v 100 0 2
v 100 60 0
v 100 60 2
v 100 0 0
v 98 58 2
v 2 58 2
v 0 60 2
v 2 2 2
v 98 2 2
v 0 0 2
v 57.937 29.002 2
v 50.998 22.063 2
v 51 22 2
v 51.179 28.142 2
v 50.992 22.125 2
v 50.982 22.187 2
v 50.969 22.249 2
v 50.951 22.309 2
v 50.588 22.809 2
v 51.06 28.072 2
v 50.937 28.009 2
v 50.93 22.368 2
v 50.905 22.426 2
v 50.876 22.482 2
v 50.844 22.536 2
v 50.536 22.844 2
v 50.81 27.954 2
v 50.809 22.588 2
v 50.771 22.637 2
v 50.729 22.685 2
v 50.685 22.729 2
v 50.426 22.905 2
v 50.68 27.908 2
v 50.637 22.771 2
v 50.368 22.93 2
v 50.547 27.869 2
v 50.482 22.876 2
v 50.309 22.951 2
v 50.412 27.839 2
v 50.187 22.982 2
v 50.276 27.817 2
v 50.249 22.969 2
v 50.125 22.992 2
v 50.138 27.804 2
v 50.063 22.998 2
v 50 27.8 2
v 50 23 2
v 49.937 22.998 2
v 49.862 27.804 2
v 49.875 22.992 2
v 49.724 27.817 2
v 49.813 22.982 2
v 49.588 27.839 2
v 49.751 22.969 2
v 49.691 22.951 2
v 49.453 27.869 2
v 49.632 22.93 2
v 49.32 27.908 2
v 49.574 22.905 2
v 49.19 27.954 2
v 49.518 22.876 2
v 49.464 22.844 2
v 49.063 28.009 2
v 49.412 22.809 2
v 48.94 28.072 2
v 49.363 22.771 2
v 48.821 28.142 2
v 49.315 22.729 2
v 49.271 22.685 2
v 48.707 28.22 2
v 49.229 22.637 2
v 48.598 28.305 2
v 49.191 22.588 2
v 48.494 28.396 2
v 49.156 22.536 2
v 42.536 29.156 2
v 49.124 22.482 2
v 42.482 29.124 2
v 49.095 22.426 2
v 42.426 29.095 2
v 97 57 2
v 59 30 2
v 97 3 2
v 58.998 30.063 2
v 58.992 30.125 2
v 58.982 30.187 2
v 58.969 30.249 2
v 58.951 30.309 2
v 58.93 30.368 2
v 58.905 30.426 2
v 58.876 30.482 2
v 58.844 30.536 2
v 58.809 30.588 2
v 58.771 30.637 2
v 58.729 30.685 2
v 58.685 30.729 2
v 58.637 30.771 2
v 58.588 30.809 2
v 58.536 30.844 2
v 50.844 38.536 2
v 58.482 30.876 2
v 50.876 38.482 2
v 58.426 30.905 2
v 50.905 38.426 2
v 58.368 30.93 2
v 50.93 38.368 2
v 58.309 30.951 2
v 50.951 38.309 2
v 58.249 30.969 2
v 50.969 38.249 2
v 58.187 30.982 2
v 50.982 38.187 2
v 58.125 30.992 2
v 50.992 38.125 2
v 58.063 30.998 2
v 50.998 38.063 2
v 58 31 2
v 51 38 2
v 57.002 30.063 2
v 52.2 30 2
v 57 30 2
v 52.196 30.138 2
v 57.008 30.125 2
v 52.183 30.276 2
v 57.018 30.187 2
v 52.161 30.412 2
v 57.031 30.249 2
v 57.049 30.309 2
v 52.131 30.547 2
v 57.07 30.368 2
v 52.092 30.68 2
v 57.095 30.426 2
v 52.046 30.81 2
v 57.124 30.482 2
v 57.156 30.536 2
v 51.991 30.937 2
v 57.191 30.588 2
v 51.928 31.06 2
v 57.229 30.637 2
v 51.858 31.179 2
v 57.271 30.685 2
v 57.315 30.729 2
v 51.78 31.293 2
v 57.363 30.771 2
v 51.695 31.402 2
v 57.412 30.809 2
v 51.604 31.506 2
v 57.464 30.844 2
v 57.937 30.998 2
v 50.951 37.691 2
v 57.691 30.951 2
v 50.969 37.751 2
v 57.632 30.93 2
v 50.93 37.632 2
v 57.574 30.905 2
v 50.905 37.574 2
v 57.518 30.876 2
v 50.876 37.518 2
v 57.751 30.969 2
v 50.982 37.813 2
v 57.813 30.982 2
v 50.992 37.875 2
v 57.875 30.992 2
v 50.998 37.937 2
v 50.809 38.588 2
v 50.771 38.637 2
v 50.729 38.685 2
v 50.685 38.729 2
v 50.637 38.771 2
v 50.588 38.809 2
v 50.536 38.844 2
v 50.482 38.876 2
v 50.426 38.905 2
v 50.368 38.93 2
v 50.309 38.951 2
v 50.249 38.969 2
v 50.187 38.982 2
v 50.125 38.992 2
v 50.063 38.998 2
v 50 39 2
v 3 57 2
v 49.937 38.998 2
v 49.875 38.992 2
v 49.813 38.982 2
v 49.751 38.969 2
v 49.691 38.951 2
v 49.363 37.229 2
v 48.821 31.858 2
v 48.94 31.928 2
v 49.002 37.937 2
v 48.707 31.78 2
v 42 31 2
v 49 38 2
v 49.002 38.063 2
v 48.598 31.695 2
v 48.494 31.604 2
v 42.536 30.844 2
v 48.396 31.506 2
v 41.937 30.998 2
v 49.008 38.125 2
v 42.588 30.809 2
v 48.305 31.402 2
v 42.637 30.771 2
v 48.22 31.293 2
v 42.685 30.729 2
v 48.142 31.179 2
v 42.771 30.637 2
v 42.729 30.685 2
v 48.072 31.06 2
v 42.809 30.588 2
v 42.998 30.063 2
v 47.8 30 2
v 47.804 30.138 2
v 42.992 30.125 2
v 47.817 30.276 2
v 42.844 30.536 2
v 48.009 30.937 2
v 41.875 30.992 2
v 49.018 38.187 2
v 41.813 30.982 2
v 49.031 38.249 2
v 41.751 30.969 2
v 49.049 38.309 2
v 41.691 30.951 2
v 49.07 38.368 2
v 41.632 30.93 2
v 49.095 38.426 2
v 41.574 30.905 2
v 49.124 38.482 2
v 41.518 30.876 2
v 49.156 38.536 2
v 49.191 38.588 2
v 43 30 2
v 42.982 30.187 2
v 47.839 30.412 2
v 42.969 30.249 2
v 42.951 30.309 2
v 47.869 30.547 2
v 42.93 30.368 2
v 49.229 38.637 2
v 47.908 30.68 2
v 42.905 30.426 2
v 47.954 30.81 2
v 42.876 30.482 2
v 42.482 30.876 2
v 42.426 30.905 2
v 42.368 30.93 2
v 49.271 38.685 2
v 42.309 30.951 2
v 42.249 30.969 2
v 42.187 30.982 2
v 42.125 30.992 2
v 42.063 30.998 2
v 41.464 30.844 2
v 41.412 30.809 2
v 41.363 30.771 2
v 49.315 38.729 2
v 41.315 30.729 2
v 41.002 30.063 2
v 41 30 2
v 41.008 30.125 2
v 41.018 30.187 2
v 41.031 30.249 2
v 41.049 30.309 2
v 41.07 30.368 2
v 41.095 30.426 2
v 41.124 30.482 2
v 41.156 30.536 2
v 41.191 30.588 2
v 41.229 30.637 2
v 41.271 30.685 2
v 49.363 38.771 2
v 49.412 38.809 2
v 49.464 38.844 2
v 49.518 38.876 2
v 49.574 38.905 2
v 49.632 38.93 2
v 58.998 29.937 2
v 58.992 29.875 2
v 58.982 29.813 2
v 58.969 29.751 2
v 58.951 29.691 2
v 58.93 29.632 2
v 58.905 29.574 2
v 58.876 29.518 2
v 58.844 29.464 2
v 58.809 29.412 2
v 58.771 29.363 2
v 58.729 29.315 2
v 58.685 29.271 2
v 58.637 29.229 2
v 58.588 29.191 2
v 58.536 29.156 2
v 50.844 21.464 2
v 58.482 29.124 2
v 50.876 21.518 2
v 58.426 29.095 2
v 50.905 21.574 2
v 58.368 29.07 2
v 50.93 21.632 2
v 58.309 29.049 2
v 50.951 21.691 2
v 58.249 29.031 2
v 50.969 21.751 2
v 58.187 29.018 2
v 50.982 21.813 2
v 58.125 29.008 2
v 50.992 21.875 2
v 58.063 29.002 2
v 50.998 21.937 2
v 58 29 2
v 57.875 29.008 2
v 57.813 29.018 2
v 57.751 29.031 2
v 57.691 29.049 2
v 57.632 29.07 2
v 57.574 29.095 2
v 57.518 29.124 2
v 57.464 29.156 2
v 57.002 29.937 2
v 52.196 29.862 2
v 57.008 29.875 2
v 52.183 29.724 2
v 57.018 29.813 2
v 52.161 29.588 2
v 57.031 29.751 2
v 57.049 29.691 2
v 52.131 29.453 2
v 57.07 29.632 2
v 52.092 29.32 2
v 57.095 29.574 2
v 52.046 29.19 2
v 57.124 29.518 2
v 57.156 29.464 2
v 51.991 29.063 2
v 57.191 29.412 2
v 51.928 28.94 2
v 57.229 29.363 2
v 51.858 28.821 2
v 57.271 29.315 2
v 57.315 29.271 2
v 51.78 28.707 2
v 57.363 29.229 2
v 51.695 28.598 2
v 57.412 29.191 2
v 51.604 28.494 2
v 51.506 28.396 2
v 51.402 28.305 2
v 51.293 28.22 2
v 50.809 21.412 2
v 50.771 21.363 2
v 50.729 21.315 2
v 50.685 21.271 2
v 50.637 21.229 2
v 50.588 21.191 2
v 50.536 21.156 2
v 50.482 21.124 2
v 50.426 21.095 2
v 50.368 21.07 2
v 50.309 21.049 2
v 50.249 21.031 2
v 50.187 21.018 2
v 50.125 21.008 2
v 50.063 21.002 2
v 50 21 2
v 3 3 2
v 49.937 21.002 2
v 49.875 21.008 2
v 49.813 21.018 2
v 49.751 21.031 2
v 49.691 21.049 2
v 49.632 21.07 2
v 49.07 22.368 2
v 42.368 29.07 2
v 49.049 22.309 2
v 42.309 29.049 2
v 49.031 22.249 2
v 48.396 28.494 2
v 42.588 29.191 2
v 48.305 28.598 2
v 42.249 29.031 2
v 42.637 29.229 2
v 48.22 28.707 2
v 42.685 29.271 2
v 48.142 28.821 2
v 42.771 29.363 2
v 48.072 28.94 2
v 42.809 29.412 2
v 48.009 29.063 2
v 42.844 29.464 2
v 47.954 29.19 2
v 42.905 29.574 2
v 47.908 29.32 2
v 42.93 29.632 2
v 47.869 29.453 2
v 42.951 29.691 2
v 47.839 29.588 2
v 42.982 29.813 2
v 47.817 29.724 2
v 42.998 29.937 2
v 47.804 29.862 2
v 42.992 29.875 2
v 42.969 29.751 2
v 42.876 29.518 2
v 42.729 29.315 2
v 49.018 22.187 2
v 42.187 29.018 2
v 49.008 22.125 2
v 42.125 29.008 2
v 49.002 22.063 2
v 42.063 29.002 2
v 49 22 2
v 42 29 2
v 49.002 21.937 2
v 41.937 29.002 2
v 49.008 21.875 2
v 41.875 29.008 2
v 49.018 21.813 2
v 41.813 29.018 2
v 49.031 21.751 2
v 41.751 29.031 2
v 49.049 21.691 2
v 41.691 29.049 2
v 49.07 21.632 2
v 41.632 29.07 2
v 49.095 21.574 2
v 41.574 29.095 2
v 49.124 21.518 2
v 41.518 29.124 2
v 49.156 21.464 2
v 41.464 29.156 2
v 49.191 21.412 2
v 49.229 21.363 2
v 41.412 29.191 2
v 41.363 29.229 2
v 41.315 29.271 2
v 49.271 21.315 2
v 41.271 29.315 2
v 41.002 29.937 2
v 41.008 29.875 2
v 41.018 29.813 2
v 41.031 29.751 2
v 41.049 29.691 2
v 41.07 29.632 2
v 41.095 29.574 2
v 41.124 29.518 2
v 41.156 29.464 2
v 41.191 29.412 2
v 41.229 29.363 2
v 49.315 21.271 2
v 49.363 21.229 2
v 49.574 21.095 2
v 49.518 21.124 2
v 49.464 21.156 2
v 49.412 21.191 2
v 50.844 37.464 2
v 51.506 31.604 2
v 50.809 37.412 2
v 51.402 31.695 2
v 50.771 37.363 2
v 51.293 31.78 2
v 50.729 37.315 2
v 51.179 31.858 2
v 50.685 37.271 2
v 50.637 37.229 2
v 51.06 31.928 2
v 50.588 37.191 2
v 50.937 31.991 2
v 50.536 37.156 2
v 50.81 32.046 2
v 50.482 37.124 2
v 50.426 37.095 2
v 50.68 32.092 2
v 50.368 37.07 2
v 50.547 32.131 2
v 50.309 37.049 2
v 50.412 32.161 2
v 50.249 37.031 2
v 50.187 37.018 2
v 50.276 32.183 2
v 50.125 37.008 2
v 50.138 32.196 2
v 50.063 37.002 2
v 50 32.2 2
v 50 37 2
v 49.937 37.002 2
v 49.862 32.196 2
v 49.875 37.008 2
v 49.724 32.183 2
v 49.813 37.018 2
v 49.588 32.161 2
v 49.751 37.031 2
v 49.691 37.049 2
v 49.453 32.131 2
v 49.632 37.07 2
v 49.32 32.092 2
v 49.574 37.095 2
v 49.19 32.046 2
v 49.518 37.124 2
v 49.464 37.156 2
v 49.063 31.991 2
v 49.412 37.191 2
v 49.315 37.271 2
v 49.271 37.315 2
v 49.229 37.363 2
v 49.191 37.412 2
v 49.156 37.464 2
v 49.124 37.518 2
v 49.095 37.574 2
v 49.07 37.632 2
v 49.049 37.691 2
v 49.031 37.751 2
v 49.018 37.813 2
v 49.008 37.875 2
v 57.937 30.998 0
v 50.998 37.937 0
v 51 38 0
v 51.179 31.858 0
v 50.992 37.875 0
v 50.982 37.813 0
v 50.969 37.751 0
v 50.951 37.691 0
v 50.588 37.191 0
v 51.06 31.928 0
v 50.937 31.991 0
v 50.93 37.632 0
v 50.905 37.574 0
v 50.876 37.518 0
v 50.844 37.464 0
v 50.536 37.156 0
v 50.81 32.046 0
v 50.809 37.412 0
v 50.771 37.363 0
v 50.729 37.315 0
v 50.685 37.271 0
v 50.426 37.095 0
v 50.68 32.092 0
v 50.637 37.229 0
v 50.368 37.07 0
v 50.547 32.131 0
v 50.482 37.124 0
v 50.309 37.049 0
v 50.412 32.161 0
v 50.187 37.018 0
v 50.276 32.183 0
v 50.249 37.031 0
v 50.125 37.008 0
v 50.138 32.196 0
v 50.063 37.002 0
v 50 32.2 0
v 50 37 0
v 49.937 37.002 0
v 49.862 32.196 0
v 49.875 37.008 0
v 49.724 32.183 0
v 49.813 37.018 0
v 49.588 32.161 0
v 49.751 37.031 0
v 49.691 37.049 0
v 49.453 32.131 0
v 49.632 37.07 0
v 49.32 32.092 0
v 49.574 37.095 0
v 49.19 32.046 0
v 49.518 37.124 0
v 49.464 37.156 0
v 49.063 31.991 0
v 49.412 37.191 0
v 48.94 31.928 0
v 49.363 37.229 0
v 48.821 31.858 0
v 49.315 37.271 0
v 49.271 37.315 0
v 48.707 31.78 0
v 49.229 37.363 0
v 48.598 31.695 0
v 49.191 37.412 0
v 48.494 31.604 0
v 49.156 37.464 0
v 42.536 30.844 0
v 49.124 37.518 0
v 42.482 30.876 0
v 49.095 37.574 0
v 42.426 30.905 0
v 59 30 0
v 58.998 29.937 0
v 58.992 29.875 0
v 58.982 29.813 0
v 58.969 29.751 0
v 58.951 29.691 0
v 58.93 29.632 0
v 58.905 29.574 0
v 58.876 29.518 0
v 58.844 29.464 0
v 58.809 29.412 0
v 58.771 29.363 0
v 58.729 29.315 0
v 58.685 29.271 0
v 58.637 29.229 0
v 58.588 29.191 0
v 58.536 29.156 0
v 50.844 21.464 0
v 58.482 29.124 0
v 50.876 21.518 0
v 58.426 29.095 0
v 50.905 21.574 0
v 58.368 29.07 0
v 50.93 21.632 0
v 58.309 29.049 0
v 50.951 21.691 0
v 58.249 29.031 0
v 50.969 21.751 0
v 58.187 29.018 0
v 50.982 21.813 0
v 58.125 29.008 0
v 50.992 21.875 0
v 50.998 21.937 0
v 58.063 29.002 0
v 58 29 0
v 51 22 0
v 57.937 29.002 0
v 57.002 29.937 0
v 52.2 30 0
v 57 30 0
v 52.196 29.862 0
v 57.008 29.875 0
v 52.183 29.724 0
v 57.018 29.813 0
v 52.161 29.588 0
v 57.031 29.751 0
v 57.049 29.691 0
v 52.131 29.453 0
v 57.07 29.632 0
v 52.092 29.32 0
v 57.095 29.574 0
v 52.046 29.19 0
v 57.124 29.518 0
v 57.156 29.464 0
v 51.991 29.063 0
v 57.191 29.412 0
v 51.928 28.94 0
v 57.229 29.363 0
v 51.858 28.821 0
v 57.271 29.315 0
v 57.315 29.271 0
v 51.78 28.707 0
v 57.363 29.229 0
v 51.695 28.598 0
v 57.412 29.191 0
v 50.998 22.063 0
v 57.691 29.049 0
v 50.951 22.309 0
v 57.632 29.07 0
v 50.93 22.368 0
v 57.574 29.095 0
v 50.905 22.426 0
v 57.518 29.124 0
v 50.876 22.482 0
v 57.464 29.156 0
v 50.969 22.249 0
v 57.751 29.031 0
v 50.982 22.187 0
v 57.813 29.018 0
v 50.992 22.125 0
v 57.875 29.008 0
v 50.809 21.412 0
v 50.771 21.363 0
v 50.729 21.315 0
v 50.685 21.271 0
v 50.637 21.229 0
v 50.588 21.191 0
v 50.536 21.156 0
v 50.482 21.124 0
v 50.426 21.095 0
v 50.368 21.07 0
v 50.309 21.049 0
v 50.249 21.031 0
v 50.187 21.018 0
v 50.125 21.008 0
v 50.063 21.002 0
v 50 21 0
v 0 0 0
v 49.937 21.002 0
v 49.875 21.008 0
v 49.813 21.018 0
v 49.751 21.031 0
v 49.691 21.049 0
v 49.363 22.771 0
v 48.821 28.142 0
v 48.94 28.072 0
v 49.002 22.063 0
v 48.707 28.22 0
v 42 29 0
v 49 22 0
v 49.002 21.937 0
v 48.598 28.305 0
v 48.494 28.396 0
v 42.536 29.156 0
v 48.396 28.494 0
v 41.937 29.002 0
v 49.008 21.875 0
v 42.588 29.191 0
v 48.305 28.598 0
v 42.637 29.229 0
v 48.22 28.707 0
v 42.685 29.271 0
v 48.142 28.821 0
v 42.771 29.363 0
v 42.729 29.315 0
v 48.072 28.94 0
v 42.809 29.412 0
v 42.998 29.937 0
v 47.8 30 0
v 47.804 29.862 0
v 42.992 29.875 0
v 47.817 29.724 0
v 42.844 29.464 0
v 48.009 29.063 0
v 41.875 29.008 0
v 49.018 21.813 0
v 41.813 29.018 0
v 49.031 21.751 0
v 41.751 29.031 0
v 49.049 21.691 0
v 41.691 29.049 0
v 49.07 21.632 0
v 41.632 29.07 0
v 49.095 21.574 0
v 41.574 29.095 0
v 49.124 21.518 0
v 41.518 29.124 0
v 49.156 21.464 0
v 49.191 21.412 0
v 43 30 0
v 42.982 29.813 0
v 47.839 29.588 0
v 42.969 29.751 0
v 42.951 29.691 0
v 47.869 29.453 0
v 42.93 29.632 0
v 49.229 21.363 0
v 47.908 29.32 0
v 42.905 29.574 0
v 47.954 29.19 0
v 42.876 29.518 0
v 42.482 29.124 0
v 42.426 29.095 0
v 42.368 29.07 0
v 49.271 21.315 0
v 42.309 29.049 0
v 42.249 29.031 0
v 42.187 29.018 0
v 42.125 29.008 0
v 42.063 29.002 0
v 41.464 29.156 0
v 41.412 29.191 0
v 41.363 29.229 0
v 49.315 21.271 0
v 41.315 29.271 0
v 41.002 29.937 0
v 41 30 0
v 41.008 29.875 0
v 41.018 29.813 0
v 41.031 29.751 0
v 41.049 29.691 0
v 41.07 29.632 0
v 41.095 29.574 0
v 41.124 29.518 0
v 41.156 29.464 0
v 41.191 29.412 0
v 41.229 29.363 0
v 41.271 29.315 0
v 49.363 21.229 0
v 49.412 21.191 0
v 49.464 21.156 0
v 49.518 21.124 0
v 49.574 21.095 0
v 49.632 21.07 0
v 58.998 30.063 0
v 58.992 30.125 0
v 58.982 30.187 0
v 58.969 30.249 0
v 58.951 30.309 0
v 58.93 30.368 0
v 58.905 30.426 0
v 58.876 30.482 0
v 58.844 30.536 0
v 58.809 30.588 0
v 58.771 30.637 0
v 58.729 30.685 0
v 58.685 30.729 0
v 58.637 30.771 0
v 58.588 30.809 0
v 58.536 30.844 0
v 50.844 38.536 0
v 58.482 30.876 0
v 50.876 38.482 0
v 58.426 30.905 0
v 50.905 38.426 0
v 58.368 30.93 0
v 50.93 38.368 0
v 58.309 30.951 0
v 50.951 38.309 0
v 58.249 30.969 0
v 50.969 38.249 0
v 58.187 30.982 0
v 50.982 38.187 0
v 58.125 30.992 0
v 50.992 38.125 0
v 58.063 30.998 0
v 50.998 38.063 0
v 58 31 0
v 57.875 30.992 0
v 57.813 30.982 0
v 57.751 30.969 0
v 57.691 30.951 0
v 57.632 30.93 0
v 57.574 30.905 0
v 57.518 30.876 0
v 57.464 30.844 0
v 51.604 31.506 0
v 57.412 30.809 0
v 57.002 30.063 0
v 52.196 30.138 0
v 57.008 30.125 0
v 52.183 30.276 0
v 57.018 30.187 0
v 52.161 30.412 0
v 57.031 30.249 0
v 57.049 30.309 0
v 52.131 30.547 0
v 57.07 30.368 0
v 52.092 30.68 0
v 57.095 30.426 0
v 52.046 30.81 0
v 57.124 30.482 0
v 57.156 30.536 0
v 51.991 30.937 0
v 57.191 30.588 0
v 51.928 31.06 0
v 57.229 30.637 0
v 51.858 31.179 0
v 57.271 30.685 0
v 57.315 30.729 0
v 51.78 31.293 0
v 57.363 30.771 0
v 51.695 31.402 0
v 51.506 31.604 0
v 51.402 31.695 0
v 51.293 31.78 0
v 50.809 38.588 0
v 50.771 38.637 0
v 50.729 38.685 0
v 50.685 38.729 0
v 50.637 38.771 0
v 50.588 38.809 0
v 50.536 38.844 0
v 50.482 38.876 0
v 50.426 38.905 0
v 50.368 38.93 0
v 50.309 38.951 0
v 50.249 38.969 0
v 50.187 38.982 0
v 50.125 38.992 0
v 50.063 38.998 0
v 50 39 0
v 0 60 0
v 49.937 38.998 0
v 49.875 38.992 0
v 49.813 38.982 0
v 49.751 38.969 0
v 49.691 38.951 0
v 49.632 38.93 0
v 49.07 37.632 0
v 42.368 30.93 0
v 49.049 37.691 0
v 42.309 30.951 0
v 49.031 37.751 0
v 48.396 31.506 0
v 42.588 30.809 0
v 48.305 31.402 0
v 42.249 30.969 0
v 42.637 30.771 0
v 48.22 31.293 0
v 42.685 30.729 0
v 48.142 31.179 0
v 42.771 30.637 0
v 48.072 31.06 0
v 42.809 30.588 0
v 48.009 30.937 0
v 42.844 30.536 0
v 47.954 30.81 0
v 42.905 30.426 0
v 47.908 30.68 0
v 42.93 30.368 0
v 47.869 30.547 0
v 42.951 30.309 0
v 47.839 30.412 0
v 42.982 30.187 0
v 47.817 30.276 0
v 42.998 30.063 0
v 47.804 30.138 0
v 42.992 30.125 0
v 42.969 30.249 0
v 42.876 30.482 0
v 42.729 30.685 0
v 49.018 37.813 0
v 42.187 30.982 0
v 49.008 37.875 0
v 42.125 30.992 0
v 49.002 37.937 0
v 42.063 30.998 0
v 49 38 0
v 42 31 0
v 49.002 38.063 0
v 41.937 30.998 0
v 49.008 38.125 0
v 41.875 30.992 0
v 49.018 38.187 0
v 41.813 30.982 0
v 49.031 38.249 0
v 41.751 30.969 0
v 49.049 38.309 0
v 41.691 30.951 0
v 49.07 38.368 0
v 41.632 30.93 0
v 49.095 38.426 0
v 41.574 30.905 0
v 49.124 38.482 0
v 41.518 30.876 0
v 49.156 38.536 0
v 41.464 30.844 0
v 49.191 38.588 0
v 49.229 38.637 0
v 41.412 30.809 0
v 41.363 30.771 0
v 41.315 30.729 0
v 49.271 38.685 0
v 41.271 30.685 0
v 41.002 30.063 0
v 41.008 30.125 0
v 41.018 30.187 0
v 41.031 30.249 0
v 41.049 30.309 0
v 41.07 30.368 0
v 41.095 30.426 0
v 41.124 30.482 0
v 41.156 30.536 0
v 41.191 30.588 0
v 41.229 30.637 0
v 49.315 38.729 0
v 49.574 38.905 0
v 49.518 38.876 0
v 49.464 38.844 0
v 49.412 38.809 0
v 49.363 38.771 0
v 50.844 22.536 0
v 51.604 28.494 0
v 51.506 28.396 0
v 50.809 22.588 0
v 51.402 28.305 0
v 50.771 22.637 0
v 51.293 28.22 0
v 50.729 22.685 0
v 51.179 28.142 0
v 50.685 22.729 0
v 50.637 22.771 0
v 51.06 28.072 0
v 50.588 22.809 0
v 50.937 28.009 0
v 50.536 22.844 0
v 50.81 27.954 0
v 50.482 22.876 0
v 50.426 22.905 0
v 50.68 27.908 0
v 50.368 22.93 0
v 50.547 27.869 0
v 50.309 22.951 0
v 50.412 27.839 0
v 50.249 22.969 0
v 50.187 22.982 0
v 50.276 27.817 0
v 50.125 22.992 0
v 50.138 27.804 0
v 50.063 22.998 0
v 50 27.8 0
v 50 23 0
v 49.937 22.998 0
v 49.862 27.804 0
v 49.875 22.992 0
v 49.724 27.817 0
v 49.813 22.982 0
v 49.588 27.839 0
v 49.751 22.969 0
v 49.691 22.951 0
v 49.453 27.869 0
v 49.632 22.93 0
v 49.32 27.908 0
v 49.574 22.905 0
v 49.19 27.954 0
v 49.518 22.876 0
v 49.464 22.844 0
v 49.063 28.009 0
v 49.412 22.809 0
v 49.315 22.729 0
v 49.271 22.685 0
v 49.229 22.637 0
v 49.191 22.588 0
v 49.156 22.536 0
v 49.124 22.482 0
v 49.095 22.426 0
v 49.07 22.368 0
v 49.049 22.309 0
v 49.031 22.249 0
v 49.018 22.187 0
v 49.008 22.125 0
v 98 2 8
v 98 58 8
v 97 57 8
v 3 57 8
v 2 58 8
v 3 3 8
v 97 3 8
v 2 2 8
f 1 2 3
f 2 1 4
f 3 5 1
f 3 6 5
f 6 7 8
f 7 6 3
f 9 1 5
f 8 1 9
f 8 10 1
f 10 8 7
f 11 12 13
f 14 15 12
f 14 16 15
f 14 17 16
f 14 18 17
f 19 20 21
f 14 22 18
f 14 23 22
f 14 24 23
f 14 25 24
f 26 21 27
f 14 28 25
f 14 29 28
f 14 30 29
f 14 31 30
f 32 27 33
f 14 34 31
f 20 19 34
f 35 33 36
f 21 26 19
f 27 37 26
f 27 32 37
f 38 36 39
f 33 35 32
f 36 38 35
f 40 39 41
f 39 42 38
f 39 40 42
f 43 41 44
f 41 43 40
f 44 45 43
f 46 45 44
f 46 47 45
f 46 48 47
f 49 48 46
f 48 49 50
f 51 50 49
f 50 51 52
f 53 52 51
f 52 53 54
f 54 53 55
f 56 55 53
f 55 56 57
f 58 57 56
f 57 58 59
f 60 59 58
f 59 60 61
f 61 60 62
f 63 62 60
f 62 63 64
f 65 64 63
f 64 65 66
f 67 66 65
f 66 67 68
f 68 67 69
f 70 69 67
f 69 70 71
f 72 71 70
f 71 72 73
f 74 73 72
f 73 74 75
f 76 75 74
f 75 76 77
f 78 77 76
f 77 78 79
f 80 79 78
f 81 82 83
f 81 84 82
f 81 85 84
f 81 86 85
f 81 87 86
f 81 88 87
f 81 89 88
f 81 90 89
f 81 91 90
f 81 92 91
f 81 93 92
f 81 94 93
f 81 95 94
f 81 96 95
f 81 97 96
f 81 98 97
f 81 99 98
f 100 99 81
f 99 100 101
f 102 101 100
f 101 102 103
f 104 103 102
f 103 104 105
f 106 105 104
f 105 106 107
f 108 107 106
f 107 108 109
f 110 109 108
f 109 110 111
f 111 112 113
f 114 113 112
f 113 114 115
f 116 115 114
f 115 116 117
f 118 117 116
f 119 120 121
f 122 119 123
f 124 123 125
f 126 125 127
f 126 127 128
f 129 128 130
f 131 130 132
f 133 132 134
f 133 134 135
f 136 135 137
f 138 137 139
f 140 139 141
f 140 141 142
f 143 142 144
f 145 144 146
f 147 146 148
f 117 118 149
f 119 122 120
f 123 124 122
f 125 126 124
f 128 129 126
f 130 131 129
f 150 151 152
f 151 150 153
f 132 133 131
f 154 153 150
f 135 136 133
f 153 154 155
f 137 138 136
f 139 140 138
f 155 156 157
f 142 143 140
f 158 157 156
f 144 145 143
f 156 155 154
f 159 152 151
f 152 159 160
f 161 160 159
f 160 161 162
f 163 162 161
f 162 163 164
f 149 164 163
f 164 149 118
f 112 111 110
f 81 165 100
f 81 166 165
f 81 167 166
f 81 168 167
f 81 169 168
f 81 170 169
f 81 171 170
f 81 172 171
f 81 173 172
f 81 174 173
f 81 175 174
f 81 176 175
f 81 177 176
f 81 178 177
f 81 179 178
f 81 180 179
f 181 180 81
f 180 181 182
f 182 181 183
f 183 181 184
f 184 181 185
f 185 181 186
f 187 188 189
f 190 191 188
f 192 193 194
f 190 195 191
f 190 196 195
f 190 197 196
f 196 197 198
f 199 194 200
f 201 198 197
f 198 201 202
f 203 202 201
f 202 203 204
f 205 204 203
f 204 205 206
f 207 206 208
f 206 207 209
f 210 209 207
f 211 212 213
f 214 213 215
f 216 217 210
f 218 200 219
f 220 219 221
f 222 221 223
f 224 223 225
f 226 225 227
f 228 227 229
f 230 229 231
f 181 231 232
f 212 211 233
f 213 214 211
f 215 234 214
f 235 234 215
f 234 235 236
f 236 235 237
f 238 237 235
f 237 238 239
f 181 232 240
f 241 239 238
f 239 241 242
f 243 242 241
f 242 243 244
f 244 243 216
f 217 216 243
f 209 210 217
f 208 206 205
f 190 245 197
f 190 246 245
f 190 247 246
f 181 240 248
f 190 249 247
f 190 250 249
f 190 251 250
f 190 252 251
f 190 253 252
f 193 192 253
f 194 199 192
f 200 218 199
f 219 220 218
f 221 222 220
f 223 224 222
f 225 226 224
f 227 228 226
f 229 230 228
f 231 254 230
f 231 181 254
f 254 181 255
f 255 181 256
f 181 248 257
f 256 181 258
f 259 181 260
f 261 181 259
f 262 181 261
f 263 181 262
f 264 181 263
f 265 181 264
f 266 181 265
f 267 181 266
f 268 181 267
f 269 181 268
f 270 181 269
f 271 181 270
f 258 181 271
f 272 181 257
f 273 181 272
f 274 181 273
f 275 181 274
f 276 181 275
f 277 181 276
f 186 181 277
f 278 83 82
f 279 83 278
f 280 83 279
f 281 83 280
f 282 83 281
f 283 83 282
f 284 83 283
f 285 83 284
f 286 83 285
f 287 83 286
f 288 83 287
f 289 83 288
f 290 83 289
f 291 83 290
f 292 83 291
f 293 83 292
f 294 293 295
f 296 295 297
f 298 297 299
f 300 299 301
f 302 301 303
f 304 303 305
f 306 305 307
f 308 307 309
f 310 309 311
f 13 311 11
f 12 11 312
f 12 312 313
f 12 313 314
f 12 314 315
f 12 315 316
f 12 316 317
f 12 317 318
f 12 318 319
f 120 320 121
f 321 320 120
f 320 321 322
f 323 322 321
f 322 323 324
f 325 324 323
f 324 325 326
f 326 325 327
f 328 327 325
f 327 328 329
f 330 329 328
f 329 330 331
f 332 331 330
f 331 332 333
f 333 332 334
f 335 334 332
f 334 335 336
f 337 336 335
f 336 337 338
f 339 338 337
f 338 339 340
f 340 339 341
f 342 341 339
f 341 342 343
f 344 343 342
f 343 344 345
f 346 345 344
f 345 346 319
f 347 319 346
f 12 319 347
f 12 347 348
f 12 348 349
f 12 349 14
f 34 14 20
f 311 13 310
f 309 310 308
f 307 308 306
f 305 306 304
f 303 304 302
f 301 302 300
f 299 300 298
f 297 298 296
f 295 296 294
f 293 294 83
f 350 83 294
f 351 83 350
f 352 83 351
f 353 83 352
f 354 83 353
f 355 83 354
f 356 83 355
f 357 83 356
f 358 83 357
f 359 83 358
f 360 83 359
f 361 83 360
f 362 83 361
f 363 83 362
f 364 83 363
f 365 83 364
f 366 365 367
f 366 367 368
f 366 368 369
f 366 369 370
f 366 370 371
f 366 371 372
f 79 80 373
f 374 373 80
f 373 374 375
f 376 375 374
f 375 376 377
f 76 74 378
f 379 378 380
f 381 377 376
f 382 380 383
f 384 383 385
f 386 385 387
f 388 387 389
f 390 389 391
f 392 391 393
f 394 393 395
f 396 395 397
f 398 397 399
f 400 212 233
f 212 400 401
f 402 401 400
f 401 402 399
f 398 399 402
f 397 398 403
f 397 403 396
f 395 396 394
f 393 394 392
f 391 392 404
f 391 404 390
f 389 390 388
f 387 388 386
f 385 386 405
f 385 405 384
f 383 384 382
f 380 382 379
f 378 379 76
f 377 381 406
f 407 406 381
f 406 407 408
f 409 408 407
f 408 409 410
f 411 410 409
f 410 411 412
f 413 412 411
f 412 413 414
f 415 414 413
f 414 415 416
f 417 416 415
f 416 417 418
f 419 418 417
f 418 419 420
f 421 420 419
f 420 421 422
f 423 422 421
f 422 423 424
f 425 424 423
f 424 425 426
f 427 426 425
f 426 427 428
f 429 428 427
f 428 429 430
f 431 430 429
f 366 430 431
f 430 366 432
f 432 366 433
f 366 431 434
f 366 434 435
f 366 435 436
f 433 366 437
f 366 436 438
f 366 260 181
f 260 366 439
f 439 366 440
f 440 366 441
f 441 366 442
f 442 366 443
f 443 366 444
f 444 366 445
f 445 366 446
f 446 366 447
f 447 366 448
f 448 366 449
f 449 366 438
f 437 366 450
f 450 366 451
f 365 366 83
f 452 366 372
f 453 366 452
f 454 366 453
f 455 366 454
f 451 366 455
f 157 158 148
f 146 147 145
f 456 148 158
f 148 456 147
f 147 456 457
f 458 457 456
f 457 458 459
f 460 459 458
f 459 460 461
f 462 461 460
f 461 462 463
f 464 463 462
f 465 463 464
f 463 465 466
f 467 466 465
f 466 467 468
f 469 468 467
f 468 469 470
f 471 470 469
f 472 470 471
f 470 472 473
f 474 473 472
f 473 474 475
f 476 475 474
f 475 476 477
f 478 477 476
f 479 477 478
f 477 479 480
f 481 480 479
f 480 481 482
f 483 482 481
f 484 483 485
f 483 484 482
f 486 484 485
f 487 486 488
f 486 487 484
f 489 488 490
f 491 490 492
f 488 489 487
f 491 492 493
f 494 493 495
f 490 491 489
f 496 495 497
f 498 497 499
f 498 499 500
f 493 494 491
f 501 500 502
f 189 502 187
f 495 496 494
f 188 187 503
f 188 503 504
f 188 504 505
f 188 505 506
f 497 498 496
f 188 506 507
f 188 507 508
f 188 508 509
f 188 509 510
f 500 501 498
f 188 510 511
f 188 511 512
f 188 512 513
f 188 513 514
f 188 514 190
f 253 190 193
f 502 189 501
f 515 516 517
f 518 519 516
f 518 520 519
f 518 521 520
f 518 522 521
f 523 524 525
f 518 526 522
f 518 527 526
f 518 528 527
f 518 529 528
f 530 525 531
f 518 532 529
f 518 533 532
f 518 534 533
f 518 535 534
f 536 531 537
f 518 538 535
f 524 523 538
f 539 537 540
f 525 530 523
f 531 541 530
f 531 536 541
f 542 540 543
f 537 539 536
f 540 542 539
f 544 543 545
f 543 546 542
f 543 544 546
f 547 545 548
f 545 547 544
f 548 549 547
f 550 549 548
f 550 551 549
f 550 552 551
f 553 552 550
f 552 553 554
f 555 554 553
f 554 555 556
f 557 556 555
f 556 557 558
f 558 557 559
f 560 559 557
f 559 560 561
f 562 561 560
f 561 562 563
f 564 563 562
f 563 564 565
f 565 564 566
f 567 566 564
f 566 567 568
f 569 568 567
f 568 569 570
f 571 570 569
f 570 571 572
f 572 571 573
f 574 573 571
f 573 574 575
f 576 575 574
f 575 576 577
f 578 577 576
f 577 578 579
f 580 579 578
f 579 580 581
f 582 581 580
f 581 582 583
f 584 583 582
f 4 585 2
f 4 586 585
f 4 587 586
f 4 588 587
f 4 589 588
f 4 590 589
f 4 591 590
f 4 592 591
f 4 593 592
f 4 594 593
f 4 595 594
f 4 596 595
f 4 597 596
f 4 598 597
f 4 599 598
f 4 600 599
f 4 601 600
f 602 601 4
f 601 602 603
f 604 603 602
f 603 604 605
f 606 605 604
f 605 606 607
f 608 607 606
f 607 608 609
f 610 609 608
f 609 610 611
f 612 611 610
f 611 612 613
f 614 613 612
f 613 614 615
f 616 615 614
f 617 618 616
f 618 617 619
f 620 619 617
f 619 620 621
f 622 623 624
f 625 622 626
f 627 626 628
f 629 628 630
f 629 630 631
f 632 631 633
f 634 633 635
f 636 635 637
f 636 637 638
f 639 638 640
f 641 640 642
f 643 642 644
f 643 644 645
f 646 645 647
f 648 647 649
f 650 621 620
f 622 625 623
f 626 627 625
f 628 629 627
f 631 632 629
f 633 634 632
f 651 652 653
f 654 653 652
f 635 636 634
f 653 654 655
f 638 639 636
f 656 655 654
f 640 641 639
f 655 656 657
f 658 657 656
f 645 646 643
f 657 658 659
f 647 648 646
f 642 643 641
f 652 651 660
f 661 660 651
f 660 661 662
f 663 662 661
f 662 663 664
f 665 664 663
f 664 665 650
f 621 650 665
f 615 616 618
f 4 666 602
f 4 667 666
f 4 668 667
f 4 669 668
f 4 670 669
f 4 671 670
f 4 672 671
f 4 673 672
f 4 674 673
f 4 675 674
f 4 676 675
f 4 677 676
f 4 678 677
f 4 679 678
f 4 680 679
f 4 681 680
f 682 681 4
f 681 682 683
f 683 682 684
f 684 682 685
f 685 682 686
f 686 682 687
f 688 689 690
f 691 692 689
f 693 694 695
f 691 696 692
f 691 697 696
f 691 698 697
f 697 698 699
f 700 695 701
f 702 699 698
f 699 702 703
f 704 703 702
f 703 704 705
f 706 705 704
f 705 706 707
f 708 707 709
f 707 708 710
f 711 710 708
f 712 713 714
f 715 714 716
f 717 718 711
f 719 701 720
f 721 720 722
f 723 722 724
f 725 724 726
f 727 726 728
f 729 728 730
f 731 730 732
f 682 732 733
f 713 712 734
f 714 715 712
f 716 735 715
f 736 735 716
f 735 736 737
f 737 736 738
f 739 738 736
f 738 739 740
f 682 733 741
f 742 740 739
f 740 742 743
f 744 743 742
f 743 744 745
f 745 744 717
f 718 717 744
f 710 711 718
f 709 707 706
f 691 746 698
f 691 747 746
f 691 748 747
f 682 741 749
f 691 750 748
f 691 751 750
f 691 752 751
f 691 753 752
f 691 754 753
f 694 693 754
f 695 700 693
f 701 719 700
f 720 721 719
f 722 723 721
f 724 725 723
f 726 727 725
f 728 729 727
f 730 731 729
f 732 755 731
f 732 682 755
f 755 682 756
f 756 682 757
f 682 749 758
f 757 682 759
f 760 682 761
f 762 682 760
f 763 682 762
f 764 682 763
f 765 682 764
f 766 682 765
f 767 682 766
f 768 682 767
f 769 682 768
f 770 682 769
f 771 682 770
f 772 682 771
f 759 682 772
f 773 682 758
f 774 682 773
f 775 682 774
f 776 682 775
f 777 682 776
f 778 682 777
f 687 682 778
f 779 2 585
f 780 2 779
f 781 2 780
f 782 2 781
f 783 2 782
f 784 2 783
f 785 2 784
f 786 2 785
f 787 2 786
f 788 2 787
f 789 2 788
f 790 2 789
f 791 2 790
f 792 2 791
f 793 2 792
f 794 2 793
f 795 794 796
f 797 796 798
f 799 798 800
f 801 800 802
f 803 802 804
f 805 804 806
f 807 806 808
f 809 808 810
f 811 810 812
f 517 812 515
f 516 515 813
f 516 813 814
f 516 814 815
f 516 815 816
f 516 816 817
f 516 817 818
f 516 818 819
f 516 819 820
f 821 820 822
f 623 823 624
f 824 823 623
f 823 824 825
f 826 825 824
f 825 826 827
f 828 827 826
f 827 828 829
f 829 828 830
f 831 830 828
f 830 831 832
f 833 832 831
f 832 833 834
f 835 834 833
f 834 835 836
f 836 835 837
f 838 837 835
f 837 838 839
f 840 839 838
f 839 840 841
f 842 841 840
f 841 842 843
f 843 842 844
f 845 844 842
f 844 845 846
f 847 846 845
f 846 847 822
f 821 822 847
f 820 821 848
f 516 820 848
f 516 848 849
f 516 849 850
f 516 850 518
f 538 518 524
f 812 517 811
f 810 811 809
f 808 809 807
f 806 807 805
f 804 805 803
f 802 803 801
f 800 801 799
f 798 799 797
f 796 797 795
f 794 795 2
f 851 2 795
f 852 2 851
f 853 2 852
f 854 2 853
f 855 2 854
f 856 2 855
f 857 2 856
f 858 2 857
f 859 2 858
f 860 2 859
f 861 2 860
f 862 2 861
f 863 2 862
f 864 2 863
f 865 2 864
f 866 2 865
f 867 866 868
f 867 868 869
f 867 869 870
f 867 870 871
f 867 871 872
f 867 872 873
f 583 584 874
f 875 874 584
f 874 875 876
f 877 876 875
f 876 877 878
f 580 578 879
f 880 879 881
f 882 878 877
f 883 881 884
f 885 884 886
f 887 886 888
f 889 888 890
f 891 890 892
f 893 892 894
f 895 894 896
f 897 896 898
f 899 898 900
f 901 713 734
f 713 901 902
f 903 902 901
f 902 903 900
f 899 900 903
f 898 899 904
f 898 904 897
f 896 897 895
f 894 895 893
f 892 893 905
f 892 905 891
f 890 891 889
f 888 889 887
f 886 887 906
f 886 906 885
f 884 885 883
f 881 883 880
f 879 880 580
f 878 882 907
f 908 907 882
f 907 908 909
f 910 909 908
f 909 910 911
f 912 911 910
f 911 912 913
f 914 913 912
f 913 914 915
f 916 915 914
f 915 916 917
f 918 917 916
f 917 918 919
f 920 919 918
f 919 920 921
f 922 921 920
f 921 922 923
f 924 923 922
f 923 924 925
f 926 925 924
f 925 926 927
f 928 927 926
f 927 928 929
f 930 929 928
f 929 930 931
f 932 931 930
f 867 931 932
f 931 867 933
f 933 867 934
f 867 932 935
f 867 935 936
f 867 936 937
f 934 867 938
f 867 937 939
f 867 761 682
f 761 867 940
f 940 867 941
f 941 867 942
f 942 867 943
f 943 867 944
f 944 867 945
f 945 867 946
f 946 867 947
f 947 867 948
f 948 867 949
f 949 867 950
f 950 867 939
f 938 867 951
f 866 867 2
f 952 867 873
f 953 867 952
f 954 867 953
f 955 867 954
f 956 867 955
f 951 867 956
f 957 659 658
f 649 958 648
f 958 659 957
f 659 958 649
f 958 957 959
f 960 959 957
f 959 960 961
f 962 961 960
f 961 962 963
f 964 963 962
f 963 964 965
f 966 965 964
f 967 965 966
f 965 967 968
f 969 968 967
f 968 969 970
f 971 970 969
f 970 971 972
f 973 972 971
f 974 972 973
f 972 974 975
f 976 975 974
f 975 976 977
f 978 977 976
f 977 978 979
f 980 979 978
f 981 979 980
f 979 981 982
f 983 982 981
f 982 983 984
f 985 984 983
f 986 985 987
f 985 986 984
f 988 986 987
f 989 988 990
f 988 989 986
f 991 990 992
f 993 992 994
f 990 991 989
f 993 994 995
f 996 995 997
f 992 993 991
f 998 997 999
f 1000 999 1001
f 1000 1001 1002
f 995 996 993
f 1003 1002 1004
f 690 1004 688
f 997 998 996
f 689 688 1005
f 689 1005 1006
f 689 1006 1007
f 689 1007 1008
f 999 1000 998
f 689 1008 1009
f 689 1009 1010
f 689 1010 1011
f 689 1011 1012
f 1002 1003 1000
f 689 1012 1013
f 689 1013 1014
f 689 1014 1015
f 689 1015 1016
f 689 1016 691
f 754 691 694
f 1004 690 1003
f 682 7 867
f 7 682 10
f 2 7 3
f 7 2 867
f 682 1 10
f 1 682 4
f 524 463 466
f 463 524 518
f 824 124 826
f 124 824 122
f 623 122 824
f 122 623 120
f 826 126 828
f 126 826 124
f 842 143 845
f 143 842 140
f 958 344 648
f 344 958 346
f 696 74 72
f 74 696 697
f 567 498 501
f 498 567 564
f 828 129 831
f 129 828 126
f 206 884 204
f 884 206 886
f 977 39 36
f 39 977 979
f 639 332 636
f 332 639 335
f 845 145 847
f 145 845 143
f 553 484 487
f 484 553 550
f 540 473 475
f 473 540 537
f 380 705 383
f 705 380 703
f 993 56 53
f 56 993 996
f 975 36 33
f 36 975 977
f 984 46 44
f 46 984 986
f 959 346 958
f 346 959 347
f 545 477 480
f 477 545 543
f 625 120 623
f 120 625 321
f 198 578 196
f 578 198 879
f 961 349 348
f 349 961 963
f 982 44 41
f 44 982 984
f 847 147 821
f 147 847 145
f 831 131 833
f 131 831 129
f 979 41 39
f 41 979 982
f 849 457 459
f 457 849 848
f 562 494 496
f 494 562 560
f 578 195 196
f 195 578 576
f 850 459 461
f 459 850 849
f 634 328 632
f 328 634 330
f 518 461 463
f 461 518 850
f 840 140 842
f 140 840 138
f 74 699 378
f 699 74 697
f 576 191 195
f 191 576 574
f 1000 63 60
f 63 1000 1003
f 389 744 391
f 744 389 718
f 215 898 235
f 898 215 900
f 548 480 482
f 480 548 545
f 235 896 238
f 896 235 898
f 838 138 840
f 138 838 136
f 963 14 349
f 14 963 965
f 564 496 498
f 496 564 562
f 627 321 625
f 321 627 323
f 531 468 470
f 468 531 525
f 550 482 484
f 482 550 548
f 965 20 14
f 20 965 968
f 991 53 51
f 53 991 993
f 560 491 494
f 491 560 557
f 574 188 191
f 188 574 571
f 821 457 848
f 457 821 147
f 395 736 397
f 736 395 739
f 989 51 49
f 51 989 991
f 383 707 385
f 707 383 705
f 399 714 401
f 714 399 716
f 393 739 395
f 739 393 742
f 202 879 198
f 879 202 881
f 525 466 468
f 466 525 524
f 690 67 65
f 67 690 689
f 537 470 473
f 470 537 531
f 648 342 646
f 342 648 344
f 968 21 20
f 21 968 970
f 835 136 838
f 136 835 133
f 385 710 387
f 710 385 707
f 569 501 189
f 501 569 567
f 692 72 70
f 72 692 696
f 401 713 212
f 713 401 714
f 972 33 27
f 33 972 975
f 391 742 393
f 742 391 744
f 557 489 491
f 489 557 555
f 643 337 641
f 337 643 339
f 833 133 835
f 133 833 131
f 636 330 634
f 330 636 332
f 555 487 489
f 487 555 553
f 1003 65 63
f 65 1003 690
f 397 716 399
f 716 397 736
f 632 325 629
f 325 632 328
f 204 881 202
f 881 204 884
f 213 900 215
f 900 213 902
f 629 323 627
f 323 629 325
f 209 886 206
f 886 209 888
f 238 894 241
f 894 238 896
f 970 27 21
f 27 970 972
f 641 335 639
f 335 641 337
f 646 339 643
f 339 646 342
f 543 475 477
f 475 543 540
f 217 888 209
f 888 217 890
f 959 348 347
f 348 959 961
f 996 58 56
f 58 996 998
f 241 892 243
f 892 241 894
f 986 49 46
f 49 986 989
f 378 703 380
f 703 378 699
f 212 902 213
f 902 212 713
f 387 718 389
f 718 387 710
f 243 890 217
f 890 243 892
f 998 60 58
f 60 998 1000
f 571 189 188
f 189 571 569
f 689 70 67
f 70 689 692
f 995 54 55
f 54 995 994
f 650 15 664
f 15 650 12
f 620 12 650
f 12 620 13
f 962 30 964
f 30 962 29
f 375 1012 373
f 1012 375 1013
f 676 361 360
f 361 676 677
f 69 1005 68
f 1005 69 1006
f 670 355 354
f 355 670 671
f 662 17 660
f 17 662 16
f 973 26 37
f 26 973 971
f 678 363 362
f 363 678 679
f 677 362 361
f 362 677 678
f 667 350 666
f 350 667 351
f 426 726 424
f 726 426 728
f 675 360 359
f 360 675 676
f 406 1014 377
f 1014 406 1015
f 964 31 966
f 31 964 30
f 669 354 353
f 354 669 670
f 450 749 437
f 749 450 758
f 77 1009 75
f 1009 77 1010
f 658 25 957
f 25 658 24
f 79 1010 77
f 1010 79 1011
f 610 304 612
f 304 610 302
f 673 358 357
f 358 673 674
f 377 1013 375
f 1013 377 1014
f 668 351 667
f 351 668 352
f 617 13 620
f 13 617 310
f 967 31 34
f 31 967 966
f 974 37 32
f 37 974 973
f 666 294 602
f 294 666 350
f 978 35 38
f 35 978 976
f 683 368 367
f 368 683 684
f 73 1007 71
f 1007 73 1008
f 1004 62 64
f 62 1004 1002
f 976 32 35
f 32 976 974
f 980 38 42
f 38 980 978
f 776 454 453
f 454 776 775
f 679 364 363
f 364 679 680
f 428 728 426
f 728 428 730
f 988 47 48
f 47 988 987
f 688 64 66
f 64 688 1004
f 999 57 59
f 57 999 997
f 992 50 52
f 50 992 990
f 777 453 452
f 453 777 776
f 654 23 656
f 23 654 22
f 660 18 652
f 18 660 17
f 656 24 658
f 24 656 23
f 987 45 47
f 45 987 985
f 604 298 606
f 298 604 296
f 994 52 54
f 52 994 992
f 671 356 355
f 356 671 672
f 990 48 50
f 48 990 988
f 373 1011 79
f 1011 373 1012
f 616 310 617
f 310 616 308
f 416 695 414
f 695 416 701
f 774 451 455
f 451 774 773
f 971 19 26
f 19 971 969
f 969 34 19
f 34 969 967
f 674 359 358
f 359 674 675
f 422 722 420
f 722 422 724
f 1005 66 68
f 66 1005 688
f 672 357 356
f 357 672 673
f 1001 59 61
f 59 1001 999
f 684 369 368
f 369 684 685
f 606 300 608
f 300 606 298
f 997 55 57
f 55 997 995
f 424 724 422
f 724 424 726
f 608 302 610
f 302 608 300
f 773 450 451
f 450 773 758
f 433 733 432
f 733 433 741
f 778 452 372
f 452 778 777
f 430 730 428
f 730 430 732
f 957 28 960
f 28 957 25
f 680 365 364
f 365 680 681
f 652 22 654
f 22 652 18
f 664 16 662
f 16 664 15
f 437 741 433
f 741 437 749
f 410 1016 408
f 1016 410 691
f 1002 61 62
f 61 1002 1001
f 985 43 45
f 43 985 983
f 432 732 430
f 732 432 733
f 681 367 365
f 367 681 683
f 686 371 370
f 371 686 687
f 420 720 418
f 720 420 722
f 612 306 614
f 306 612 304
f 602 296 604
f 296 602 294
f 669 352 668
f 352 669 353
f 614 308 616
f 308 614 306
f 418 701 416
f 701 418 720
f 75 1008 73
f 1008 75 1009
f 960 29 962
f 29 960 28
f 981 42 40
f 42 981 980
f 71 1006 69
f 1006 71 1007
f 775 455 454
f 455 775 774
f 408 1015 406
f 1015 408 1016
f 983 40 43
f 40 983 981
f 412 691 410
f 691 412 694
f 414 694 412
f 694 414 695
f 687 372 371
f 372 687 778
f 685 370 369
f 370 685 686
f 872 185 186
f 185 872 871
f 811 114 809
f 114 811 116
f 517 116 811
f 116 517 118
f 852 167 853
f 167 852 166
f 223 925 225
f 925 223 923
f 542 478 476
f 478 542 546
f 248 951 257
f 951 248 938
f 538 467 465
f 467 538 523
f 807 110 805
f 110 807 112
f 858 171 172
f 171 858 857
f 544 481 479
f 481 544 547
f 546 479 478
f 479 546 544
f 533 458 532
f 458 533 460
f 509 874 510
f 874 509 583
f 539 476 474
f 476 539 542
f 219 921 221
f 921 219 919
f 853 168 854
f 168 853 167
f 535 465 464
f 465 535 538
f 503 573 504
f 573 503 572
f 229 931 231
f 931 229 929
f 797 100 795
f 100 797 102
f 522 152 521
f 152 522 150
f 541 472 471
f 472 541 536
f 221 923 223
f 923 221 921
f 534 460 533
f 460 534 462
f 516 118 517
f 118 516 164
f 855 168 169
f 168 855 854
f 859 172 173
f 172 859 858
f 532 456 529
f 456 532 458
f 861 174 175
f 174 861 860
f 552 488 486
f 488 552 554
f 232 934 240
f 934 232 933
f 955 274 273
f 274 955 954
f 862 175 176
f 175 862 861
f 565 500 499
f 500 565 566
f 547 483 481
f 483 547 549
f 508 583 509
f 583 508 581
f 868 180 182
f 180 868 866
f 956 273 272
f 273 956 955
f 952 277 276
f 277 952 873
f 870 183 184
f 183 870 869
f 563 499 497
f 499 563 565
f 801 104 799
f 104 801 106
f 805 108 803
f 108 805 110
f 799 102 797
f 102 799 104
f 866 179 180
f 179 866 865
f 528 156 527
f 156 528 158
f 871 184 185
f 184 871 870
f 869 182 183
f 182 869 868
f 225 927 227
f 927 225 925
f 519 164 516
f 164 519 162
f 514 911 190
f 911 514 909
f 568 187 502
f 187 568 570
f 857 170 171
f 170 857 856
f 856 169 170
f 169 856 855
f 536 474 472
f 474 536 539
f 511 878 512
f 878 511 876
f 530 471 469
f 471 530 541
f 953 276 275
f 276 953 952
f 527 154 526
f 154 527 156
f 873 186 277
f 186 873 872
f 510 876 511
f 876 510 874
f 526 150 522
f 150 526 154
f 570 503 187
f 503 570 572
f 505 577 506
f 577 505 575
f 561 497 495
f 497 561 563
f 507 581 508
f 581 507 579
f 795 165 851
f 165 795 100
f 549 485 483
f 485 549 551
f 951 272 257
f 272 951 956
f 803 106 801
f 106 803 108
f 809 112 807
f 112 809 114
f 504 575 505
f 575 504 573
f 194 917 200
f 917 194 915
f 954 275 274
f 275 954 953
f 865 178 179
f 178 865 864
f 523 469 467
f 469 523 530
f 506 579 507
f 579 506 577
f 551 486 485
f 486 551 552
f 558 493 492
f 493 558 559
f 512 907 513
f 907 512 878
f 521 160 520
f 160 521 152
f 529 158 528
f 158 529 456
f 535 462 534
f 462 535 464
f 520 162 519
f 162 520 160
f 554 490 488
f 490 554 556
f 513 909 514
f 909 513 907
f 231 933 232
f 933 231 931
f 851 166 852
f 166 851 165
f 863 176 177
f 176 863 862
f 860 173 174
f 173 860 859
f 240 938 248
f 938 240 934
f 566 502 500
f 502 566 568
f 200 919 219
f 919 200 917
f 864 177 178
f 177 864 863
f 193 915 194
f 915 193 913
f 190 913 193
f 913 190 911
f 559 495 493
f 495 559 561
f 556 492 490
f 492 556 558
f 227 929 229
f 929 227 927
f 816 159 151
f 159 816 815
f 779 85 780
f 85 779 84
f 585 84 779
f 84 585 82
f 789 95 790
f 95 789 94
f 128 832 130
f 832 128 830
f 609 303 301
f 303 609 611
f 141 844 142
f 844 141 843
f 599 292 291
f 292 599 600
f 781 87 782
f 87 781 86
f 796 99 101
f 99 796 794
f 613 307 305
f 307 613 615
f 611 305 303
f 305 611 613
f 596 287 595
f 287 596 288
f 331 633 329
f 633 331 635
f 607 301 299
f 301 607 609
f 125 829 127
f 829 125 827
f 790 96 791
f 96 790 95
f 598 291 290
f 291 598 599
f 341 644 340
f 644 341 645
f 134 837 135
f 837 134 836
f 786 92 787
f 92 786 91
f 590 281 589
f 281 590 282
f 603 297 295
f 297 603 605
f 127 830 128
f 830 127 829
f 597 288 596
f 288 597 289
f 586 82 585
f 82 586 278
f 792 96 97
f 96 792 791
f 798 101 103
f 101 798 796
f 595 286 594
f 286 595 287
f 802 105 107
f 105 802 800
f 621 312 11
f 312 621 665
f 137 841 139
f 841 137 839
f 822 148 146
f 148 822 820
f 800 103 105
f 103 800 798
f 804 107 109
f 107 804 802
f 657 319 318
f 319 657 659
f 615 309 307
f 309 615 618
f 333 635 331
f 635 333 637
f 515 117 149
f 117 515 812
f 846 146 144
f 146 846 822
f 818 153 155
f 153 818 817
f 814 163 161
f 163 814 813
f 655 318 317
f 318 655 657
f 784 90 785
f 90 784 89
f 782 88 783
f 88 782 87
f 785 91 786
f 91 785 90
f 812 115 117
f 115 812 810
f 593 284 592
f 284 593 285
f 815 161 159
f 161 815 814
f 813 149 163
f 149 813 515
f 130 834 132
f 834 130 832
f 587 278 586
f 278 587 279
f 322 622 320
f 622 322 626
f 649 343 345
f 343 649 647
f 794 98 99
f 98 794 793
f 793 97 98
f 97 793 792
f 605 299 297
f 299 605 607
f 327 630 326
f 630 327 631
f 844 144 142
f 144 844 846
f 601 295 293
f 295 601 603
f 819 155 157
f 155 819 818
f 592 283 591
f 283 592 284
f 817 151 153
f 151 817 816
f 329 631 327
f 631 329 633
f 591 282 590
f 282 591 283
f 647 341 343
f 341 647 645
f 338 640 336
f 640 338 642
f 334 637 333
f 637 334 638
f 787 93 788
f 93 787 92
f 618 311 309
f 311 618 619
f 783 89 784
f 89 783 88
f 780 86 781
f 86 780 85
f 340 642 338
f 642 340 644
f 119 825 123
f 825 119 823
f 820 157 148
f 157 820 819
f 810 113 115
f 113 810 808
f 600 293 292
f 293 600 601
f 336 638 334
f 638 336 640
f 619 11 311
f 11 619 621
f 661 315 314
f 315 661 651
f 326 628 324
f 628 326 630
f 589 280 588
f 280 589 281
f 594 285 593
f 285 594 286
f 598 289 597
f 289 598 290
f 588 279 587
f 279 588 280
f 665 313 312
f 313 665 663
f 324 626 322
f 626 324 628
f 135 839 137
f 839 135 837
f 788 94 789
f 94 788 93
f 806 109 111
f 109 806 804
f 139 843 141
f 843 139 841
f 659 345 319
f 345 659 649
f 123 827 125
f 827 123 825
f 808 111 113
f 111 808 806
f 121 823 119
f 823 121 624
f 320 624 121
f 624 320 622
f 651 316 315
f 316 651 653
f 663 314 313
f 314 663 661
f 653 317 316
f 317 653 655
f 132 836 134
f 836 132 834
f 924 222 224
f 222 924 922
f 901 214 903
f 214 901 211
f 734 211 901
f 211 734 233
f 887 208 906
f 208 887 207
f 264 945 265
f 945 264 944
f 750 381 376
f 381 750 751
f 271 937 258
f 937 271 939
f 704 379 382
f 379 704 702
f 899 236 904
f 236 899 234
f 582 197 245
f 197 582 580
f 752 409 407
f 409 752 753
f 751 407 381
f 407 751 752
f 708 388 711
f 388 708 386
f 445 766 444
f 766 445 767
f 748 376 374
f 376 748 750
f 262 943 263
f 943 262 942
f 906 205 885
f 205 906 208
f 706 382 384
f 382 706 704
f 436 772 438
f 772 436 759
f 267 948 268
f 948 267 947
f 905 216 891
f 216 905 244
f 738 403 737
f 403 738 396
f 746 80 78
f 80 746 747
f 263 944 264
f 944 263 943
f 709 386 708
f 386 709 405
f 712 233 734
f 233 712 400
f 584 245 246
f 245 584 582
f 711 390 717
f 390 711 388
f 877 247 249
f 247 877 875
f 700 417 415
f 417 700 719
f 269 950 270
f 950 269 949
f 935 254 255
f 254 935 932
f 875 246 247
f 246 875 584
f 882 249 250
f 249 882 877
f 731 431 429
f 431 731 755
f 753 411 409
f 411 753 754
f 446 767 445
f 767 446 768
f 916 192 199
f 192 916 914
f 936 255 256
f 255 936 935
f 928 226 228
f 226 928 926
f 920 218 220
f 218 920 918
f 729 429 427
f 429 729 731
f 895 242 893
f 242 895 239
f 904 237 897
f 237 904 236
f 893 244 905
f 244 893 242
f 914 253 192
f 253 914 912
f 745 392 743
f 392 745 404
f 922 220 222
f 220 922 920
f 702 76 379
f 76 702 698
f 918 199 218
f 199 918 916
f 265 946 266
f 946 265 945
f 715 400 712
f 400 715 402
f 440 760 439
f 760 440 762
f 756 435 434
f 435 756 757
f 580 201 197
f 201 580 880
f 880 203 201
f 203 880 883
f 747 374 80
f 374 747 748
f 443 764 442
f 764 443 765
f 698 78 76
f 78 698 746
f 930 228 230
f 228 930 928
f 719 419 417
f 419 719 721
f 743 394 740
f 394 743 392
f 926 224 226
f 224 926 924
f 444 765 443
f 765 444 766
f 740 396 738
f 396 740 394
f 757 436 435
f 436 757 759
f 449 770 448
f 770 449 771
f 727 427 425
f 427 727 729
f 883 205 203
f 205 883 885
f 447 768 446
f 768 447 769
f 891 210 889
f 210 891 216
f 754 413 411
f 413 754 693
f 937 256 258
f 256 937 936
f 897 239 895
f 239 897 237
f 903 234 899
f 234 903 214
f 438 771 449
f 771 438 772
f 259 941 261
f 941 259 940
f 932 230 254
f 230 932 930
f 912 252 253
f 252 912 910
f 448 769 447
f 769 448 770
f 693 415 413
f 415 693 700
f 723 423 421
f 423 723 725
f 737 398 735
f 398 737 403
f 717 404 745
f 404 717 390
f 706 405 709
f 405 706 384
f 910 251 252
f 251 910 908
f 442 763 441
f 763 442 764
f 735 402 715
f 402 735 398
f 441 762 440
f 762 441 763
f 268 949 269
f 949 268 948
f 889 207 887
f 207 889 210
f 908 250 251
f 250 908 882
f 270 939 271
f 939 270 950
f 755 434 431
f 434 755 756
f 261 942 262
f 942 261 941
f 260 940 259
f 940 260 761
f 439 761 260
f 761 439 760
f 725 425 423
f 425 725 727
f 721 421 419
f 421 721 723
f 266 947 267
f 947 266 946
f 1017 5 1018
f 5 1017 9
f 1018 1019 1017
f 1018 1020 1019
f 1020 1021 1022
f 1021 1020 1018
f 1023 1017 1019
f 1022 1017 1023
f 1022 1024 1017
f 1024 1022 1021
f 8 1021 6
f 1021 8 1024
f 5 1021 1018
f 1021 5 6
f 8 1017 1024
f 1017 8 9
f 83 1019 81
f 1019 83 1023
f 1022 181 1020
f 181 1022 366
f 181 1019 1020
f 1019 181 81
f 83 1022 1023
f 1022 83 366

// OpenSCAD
/*  Tapa para gabinete probador de continuidad
    CEKIT - 08/02/2001
*/

union(){
    
    // Tapa (base)
    difference(){
        cube([100,60,2]);
        // taladros buzzer
        translate([50,30,0])
        cylinder(r=2.2,h=4, $fn=100);
        translate([50,22,0])
        cylinder(r=1,h=4, $fn=100);
        translate([50,38,0])
        cylinder(r=1,h=4, $fn=100);
        translate([58,30,0])
        cylinder(r=1,h=4, $fn=100);
        translate([42,30,0])
        cylinder(r=1,h=4, $fn=100);
    }
    // Borde interno
    difference(){
        translate([2,2,0])
        cube([96,56,8]);
        translate([3,3,0])
        cube([94,54,8]);
    }
    
}
